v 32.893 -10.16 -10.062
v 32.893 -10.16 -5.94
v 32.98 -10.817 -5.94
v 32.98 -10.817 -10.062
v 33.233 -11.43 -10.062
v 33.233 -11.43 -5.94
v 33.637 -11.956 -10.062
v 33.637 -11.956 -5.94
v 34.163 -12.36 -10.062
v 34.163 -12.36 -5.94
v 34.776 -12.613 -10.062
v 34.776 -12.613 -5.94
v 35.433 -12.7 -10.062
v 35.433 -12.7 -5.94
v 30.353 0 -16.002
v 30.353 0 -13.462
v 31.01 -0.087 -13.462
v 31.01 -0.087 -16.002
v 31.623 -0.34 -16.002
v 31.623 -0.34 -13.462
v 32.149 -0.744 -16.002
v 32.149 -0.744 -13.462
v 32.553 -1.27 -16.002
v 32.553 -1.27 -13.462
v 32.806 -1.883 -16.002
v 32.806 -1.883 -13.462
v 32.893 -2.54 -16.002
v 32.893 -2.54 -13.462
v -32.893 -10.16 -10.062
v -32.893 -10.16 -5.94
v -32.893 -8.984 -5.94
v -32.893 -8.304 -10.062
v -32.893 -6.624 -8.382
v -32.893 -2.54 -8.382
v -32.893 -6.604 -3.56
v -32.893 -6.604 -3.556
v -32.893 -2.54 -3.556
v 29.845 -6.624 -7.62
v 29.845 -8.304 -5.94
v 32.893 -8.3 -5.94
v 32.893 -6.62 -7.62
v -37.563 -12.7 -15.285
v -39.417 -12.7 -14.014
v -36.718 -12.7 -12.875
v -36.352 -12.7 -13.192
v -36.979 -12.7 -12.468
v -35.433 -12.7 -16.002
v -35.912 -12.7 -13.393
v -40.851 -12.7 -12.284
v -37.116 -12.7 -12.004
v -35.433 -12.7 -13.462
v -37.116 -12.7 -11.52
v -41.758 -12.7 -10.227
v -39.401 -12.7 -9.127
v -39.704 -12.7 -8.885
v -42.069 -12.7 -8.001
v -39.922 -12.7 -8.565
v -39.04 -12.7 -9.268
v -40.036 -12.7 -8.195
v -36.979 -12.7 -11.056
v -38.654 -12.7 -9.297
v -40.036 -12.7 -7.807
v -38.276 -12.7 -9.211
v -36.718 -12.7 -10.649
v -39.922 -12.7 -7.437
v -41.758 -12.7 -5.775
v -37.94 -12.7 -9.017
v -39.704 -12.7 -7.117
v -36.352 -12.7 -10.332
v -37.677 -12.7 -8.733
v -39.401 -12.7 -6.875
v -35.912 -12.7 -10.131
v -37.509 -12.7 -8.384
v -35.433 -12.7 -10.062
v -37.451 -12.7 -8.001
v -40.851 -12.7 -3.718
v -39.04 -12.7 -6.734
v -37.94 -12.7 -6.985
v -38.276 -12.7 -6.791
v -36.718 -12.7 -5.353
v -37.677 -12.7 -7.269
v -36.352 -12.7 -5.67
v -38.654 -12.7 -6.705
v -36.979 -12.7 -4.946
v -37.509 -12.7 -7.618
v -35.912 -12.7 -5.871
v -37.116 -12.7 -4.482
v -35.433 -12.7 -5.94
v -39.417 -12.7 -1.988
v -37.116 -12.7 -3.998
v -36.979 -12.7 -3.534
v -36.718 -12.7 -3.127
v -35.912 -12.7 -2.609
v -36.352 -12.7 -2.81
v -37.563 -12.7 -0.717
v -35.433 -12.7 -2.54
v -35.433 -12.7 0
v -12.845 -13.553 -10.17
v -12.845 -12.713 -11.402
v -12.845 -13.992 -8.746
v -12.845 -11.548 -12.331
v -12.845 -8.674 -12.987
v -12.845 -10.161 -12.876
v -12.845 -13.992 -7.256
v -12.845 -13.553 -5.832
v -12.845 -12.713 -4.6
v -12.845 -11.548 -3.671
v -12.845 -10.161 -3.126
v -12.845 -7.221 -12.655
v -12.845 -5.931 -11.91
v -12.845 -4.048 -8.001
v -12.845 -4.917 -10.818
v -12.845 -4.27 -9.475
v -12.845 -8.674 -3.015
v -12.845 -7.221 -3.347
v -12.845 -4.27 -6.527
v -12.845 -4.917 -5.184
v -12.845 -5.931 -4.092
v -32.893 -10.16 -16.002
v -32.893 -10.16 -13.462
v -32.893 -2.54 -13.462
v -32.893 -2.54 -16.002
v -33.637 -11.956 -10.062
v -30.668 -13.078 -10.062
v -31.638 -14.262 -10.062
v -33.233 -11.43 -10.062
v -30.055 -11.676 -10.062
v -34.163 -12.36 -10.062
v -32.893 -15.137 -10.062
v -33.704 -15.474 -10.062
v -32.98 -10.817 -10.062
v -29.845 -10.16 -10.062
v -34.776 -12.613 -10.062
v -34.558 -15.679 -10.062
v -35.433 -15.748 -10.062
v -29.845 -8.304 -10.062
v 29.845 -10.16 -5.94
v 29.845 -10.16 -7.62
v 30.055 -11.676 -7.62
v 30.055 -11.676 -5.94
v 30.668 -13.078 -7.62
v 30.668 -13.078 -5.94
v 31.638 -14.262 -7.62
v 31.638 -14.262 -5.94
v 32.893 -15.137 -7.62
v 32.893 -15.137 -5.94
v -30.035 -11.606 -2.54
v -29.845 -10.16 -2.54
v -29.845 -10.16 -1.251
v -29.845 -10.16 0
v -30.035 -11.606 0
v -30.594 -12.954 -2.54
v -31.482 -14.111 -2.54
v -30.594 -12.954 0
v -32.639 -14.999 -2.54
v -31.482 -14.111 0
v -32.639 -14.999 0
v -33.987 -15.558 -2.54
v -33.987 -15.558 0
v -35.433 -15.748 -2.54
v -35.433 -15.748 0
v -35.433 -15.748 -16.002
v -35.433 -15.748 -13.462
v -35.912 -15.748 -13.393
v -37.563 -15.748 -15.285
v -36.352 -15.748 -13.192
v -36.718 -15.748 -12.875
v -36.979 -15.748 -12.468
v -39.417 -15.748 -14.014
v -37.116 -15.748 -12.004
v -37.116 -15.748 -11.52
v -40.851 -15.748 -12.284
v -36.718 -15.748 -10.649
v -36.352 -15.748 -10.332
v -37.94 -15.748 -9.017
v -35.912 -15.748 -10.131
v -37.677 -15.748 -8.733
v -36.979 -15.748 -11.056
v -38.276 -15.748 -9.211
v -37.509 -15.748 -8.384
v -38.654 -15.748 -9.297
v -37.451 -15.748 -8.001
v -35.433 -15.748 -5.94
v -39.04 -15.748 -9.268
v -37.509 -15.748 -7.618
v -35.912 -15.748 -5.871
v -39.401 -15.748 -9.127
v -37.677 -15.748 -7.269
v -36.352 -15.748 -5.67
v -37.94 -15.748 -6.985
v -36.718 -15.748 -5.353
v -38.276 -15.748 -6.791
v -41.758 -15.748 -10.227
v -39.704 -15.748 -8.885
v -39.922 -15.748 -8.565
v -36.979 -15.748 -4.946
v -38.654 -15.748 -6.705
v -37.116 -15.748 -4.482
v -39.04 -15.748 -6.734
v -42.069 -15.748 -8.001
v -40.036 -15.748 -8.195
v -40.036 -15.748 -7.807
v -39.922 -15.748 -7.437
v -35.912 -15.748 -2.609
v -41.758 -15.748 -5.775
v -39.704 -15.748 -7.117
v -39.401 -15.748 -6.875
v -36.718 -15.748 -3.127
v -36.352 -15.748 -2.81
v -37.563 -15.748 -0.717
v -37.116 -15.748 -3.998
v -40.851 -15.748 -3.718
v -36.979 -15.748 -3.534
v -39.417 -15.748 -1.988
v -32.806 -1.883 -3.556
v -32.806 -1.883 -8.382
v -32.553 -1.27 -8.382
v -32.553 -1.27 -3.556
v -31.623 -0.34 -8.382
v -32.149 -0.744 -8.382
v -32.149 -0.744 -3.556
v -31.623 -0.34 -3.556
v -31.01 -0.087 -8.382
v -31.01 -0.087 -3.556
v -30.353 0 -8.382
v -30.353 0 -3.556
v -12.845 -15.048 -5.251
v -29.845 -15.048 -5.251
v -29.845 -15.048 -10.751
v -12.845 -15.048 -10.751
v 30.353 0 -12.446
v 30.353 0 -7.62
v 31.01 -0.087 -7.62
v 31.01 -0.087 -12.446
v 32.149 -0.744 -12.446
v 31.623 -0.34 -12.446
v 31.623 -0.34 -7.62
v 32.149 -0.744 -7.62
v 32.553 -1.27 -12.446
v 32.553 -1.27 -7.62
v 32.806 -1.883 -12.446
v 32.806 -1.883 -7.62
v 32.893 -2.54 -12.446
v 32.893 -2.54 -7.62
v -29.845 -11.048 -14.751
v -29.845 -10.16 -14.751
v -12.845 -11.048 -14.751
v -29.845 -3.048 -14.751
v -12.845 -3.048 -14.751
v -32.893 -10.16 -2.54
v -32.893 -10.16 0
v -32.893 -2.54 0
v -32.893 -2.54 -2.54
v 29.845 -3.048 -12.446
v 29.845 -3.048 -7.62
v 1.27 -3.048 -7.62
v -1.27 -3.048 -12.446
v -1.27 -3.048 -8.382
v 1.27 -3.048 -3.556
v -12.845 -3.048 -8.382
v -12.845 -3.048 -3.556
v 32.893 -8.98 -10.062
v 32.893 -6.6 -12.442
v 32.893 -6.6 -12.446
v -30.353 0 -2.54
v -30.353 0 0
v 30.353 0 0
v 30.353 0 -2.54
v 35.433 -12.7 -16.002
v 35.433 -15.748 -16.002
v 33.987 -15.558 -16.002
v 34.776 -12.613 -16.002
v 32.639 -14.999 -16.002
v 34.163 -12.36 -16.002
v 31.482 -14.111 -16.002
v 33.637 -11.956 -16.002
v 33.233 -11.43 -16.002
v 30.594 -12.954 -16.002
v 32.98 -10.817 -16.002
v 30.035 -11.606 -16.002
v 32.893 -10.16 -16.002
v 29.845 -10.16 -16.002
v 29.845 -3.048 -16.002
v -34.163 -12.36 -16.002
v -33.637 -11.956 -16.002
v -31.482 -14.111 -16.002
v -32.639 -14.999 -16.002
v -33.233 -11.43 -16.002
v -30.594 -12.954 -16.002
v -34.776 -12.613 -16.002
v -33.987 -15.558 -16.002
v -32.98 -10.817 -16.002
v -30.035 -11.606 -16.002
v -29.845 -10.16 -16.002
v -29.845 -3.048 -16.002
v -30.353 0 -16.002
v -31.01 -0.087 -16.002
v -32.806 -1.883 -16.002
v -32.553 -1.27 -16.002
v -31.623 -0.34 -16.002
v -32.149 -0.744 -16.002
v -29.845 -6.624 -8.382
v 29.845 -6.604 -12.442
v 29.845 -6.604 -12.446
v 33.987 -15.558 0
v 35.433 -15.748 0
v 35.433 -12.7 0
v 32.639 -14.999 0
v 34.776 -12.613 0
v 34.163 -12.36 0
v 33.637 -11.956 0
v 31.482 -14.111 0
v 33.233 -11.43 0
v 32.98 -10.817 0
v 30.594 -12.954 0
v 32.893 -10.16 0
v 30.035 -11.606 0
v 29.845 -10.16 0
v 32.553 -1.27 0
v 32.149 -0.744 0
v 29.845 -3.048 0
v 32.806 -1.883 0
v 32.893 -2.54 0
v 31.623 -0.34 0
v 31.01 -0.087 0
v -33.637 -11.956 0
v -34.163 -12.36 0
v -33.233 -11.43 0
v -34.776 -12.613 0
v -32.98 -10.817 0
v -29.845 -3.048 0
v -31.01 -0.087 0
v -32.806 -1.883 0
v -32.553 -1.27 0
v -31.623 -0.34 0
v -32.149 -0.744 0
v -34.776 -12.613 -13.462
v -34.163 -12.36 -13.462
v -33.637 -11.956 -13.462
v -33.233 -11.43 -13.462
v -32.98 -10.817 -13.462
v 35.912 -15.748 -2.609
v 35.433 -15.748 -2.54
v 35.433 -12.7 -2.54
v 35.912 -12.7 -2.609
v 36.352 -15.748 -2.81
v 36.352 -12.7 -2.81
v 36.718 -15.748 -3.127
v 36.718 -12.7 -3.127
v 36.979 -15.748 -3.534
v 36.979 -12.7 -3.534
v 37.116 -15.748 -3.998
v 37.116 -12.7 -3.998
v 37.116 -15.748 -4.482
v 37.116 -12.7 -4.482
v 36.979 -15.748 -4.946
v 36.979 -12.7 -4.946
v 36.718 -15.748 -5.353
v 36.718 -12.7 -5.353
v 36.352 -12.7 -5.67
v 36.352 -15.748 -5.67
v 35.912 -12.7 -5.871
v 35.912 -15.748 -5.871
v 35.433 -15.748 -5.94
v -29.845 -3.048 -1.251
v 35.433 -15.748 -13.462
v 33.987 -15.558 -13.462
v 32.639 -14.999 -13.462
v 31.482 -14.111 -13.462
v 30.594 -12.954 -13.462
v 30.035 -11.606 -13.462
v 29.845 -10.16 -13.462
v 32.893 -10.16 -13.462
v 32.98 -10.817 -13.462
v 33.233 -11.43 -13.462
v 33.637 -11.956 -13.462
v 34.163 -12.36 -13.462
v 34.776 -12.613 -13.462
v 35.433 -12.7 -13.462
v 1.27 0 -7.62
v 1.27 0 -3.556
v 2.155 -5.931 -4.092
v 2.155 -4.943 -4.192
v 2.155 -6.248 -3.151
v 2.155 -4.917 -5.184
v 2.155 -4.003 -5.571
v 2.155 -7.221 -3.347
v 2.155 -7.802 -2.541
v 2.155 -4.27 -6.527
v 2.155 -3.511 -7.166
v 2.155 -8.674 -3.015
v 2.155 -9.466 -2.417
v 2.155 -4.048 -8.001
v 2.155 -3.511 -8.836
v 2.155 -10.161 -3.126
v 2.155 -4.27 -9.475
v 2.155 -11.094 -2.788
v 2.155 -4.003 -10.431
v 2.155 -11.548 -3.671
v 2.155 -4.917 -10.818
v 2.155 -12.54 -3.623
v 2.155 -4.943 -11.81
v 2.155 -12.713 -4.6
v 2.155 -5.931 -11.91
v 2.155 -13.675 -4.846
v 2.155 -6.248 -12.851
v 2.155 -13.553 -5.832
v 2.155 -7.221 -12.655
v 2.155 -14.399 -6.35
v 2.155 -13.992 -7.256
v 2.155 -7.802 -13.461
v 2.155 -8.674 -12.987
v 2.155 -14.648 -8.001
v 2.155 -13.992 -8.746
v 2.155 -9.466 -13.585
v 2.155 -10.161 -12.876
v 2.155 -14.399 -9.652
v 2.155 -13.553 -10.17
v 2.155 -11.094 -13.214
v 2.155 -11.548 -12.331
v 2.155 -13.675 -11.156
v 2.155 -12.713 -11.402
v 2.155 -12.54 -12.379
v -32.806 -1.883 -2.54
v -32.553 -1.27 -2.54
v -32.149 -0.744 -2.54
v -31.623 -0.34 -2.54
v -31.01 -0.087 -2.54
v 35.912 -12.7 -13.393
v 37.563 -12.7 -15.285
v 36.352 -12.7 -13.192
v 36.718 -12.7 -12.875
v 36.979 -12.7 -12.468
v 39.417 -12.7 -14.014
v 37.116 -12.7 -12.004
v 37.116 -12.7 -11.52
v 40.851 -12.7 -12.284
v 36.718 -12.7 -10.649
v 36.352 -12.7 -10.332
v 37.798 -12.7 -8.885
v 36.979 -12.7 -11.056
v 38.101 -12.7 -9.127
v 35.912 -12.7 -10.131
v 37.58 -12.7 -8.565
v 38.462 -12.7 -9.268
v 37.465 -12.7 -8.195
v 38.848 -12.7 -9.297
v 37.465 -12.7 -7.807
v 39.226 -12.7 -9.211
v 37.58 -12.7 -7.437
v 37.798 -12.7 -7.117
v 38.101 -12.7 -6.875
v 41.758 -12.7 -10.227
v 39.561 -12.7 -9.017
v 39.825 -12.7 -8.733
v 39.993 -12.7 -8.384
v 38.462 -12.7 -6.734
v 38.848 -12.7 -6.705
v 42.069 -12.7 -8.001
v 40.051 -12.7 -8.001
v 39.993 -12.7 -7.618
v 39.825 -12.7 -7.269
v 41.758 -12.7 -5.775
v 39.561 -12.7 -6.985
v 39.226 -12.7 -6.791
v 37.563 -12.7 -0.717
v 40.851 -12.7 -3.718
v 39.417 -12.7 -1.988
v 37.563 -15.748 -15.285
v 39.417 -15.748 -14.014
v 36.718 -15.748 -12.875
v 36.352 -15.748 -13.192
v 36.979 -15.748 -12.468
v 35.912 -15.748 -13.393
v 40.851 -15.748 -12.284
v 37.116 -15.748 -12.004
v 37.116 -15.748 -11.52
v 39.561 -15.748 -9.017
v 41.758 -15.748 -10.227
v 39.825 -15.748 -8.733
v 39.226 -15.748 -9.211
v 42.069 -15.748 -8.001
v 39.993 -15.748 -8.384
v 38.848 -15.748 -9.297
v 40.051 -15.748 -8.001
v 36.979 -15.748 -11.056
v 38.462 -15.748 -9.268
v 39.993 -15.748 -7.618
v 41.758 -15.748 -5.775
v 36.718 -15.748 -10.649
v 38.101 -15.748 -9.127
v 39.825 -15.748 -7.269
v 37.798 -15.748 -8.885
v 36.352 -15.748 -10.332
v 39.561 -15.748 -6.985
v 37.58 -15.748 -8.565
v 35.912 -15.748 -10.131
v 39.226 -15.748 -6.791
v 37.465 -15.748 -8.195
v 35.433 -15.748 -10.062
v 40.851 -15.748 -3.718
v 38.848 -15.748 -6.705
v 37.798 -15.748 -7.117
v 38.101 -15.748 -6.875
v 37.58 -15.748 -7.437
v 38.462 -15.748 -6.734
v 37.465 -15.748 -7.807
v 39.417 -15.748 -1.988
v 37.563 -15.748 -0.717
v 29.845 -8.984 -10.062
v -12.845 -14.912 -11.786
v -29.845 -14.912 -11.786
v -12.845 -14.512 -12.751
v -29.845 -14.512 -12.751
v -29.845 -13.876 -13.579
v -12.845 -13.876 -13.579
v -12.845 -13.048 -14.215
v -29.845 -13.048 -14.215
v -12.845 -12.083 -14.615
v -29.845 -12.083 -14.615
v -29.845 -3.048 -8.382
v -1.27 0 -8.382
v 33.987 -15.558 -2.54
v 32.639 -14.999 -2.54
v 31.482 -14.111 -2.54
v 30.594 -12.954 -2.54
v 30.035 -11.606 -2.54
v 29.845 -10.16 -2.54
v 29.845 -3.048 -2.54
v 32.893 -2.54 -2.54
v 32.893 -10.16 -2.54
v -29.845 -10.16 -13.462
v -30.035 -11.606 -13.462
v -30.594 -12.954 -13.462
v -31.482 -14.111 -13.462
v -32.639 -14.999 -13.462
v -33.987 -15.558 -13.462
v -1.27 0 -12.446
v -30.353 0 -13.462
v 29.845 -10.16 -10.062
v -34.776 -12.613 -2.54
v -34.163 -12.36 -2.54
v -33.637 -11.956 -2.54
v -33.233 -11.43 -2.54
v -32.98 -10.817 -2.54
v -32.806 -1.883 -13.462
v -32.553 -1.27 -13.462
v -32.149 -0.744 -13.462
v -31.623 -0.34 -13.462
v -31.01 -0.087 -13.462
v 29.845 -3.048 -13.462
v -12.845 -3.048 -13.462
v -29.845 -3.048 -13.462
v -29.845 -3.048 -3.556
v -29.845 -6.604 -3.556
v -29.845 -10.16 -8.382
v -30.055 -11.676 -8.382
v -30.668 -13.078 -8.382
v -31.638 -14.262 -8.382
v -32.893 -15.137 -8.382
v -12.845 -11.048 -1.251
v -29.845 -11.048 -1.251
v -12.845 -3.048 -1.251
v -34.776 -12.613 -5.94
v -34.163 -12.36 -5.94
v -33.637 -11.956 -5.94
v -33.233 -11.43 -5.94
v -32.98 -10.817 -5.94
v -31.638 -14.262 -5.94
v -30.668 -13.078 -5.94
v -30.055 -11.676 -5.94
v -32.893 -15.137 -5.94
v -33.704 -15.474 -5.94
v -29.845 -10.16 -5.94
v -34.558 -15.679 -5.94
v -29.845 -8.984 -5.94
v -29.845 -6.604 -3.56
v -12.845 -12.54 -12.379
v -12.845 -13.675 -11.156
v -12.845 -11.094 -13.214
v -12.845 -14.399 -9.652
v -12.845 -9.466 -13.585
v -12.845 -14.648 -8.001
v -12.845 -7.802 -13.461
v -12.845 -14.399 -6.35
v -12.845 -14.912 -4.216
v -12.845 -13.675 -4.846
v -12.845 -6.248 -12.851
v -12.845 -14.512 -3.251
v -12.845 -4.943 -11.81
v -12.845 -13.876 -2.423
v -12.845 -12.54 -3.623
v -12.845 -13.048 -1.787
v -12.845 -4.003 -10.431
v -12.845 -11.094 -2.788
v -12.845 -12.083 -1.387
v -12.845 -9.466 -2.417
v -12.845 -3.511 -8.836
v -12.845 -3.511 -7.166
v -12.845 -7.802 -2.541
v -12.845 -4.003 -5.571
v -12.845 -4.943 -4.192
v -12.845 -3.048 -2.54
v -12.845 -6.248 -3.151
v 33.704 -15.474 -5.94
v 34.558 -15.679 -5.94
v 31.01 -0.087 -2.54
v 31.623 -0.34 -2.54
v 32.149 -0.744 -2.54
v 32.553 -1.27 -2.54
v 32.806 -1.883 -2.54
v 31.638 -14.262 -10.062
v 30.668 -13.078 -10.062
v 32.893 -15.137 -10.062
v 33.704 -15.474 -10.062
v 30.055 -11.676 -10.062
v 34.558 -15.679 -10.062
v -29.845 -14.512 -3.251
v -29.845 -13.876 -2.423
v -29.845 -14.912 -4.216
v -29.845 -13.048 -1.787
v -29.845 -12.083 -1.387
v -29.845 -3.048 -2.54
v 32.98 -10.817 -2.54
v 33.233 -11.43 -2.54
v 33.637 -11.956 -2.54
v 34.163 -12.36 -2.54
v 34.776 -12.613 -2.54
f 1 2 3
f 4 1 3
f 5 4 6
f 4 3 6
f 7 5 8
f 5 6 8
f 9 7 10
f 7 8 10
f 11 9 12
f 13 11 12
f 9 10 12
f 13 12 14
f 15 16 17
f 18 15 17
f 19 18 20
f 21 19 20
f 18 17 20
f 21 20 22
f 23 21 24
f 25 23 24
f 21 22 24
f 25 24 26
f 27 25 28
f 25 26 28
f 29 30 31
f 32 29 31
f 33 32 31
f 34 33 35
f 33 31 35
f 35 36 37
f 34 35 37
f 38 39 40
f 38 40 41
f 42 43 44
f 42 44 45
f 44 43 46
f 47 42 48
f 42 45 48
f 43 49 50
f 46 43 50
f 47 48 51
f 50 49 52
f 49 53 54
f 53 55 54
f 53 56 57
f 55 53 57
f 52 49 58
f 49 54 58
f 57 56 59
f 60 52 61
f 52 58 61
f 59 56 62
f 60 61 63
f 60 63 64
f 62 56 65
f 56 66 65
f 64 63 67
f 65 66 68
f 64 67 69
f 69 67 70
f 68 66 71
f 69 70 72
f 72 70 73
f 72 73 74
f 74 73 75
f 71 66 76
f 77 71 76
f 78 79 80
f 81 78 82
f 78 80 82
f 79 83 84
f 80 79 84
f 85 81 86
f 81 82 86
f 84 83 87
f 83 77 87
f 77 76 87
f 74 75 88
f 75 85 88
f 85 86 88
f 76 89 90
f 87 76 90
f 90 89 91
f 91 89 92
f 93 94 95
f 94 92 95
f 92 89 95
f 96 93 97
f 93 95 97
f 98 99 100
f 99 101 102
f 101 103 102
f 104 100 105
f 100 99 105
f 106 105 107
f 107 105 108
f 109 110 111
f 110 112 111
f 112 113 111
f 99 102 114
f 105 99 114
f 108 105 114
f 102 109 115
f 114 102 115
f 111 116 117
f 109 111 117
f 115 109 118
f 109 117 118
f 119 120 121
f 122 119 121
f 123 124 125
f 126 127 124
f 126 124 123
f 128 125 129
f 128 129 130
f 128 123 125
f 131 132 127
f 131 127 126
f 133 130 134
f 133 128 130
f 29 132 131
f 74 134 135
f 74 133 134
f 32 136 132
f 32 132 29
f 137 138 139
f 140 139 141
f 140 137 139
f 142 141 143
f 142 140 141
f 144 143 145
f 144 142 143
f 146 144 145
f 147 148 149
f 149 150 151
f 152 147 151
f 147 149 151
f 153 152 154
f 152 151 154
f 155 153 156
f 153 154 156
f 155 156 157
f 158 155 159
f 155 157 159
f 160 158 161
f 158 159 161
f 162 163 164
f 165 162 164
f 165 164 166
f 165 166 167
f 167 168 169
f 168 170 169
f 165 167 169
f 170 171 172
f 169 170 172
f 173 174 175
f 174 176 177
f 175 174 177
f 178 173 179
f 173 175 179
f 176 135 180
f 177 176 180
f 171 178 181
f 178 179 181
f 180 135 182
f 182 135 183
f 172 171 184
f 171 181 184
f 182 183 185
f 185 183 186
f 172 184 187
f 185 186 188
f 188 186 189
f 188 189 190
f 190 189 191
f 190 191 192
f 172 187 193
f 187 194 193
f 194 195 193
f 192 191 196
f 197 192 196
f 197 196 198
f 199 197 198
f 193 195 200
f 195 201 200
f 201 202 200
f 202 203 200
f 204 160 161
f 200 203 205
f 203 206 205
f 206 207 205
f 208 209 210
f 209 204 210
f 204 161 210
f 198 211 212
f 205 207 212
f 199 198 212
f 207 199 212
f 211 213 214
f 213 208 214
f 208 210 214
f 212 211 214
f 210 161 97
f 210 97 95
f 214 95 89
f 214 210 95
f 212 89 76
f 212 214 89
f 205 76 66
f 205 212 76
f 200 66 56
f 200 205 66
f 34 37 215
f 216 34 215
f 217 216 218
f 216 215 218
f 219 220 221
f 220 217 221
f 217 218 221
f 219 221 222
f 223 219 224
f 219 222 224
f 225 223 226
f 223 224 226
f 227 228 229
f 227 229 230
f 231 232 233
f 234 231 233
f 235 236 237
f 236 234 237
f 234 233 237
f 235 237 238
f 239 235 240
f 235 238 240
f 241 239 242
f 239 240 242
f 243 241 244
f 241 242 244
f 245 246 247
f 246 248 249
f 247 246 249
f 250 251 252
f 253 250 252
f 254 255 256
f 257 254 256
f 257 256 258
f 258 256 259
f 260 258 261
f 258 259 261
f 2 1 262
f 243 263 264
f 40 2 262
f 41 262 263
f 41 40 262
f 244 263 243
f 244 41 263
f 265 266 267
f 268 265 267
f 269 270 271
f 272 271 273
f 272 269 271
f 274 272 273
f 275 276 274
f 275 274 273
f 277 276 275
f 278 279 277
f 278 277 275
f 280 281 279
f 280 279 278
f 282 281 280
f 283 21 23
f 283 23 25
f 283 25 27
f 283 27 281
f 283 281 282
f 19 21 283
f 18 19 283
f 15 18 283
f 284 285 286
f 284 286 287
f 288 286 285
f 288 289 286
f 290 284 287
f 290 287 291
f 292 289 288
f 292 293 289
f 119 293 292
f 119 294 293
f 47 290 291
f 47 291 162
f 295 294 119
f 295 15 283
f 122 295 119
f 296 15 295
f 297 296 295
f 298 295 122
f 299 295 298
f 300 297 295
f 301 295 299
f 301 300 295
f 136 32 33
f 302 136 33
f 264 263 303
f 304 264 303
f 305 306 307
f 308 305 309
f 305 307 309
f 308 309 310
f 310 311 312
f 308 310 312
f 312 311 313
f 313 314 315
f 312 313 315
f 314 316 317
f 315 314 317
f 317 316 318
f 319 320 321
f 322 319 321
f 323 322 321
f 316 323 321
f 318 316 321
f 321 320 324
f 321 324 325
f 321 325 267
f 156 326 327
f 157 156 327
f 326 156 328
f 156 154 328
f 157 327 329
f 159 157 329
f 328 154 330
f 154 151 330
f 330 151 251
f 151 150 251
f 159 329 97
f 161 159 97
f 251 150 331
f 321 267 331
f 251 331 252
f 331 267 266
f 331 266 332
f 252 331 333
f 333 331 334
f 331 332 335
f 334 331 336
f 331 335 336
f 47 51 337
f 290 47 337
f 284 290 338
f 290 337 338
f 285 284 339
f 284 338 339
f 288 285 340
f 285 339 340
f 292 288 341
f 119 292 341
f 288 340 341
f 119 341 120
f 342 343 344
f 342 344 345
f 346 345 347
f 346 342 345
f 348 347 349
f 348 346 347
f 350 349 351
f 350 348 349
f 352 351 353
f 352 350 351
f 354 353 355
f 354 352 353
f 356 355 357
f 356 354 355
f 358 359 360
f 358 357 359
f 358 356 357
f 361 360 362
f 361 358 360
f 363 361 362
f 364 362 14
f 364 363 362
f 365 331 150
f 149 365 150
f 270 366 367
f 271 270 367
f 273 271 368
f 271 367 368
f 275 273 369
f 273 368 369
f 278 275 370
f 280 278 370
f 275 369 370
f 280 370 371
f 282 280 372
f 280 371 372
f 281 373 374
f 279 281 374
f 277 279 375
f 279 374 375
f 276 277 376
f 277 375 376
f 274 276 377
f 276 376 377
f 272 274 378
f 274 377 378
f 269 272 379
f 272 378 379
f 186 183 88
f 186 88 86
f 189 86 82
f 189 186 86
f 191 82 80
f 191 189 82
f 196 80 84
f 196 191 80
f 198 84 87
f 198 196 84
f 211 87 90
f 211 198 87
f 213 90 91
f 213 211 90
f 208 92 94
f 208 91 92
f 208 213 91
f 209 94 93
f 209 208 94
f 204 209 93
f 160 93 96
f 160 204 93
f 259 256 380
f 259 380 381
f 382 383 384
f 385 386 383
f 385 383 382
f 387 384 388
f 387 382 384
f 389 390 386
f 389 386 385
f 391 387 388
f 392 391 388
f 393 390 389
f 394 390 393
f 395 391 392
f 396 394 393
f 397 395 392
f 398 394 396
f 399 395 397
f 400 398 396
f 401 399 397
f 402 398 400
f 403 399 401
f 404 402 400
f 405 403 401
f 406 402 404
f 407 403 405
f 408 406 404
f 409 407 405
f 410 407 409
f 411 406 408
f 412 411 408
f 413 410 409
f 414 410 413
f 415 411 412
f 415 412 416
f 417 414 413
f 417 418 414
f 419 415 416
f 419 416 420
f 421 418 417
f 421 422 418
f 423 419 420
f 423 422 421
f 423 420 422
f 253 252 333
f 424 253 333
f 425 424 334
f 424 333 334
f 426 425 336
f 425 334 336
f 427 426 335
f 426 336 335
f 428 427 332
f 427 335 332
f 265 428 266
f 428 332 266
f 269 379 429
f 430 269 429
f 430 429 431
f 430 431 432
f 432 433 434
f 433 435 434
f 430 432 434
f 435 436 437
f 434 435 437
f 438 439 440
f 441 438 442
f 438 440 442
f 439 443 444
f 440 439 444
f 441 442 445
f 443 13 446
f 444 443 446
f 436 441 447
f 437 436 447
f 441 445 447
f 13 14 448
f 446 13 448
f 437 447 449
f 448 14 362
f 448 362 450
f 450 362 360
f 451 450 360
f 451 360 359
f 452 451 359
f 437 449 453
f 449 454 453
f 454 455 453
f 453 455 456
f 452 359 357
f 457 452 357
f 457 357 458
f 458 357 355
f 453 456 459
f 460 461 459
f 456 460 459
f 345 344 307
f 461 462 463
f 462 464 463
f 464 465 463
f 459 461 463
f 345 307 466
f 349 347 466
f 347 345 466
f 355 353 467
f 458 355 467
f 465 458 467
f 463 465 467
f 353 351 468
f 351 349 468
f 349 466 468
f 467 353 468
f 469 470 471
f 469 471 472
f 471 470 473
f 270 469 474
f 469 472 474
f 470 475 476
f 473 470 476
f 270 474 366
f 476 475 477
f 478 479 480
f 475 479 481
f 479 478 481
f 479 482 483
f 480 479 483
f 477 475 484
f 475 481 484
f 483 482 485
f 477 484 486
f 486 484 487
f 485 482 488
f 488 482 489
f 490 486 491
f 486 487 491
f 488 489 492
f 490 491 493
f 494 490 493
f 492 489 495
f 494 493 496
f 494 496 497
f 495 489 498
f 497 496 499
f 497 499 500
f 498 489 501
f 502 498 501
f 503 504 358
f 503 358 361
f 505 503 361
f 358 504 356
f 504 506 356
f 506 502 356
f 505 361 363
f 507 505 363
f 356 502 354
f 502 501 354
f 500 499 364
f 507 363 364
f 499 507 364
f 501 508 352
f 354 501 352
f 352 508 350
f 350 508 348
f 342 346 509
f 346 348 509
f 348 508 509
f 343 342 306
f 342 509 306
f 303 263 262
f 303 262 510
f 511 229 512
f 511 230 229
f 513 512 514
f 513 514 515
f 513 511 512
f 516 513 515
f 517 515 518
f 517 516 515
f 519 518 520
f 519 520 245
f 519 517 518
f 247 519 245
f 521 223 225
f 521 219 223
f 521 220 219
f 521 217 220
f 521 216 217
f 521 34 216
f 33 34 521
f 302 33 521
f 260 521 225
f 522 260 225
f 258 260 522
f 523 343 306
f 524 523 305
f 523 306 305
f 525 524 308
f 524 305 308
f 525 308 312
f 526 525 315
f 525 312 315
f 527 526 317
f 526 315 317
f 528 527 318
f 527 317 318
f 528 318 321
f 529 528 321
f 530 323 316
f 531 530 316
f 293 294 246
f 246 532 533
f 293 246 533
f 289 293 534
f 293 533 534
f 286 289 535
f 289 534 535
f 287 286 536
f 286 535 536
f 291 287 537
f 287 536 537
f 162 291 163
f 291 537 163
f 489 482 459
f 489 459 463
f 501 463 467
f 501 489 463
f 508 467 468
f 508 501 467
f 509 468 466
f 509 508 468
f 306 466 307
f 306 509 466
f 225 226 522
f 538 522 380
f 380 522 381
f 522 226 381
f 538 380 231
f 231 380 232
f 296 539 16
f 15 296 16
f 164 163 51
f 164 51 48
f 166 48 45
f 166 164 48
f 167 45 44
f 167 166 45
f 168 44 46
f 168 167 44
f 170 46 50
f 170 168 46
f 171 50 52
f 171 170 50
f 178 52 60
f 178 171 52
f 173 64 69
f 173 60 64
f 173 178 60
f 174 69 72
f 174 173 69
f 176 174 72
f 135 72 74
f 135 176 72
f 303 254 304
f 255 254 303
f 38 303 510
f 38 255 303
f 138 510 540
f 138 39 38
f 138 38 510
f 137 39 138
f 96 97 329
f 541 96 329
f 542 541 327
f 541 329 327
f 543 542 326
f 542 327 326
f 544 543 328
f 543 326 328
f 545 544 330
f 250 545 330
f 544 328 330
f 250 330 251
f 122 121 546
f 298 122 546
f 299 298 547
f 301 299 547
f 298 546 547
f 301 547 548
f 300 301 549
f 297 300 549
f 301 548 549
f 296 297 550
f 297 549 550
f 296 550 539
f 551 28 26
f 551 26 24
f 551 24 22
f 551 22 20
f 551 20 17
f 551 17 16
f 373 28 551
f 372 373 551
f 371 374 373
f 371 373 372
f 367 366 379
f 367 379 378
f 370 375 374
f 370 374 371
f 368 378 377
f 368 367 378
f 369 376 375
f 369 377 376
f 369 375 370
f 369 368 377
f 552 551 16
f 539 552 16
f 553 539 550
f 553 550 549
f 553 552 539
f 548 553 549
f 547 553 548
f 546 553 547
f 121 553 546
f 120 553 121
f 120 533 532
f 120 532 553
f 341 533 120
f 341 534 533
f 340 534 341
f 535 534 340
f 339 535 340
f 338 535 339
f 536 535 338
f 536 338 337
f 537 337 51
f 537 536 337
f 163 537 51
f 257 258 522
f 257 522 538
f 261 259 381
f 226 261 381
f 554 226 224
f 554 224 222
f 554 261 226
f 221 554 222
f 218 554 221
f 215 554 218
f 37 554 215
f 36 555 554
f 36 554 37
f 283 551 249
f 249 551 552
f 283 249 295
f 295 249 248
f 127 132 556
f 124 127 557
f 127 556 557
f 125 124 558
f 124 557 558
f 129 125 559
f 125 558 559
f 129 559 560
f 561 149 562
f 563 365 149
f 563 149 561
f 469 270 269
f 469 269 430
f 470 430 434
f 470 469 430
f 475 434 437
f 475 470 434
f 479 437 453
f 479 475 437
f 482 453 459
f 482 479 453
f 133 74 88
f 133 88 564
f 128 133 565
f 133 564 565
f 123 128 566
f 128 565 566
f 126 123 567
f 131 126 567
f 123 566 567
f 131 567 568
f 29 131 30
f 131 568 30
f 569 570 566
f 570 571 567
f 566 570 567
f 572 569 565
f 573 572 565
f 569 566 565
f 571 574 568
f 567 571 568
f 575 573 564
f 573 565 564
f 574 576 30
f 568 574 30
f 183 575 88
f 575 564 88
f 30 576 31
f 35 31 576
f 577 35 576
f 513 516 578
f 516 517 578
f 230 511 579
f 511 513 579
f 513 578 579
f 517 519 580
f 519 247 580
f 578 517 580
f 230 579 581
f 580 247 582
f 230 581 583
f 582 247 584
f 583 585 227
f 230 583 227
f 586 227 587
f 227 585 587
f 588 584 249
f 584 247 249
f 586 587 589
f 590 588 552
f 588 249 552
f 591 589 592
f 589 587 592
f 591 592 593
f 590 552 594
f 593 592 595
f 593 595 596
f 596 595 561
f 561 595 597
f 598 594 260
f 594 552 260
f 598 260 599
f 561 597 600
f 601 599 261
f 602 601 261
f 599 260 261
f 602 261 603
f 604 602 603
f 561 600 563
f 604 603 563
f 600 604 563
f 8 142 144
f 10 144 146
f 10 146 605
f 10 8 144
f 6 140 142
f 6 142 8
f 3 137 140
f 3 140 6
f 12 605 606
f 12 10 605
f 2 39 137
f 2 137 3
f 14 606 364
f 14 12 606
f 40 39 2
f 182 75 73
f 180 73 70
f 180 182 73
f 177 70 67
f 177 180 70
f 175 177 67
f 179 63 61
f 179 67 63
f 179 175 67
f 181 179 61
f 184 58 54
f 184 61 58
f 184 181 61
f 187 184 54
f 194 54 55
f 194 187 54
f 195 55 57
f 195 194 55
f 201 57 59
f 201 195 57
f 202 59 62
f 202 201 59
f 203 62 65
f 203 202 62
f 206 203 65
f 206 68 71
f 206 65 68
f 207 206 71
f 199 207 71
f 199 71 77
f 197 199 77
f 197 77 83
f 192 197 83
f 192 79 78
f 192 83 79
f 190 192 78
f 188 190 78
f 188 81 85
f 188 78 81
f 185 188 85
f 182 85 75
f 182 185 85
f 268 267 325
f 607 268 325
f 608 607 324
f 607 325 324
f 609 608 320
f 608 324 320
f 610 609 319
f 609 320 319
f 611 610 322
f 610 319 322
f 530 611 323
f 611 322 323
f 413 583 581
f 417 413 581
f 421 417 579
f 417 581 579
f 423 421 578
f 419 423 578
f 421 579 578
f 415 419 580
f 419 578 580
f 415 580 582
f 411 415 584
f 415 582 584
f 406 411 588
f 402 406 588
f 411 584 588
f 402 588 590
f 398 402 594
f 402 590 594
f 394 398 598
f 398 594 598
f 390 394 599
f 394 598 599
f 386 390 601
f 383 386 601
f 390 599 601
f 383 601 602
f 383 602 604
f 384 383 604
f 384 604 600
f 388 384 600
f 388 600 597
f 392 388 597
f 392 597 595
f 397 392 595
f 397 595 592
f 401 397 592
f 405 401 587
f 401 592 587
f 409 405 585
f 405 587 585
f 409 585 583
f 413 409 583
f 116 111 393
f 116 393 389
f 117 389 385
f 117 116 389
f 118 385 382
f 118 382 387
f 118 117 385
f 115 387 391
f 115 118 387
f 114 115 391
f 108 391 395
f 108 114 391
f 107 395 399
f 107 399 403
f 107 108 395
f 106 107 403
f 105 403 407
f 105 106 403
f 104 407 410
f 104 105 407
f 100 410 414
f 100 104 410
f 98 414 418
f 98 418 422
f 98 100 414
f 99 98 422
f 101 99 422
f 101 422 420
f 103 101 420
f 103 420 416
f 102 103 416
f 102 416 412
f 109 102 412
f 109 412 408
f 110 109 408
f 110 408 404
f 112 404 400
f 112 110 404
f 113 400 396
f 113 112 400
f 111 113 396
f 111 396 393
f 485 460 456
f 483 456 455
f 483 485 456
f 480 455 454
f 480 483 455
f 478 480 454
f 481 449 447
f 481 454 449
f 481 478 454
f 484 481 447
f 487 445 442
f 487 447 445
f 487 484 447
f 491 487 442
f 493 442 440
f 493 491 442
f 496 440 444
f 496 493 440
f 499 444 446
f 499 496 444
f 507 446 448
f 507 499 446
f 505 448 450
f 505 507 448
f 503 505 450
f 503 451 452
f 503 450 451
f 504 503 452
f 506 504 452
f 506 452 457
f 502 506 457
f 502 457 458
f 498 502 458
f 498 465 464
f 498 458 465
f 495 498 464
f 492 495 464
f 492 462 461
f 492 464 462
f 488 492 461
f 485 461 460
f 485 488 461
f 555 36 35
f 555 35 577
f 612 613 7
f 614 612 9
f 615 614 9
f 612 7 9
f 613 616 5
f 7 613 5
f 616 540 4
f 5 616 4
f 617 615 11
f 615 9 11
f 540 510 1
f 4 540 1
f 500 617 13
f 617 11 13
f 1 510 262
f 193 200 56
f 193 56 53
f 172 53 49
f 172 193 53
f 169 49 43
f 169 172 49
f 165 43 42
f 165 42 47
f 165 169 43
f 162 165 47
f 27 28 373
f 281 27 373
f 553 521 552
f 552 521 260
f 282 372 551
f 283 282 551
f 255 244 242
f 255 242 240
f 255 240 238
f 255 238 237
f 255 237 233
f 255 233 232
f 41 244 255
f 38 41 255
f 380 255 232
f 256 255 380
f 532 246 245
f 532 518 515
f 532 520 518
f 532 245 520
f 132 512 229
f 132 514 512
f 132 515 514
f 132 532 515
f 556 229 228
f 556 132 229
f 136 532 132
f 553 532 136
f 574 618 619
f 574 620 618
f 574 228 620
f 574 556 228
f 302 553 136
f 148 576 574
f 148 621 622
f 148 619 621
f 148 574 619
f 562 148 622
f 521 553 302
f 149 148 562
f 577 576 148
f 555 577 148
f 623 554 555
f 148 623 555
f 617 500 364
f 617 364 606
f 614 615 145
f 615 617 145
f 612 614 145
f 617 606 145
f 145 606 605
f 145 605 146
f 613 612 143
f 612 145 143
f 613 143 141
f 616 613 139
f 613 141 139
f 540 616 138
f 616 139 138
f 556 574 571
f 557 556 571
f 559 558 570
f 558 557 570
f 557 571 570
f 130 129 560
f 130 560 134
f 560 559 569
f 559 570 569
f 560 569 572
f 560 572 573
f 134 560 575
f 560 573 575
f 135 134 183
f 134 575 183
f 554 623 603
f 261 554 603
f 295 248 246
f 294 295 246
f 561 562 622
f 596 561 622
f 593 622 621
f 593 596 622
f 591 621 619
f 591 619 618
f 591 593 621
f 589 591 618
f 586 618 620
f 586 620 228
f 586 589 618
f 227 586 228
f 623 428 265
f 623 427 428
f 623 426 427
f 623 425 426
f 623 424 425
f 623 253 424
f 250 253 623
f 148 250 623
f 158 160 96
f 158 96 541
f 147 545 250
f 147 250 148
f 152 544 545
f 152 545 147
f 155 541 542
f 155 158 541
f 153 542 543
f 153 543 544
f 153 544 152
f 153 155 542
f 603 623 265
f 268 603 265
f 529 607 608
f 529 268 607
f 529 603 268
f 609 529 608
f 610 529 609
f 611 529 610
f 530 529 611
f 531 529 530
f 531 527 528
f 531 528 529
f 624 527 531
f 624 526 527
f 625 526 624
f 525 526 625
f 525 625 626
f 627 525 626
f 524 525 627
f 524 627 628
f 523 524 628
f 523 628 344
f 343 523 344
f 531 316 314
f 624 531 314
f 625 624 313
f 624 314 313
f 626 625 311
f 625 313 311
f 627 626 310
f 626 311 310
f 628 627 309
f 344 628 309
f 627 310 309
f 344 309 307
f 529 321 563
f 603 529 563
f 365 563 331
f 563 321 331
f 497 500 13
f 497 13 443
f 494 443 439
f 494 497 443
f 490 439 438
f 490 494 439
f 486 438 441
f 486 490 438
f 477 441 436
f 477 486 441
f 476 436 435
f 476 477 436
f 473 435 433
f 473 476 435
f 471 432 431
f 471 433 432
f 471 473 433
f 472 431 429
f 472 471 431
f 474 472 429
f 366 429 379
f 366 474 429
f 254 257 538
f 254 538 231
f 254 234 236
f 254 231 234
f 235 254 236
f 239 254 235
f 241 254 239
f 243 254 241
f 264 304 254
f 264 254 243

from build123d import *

# Parameters (mm, degrees)
EXTRUDE_THIN1_DEPTH    = 16.002
CUT_EXTRUDE1_START     = -15.748
CUT_EXTRUDE1_OUTLINE_R = 1.3
CUT_EXTRUDE1_DEPTH     = 15.748
BOSS_EXTRUDE2_DEPTH    = 1.68
BOSS_EXTRUDE3_START    = 1.68
BOSS_EXTRUDE3_DEPTH    = 1.68
CUT_EXTRUDE2_START     = -2.384
CUT_EXTRUDE2_DEPTH     = 2.384
CUT_EXTRUDE3_DEPTH     = 2.384
CHAMFER1_SIZE          = 1.7
CHAMFER2_SIZE          = 2.38
SKETCH10_W             = 17
SKETCH10_H             = 13.5
BOSS_EXTRUDE4_DEPTH    = 12
SKETCH11_R             = 5.6
SKETCH11_R_2           = 5
BOSS_EXTRUDE5_DEPTH    = 15
FILLET1_R              = 4


# Read off the part's stored shape, not the designer's step: Cut-Extrude1
with BuildPart() as part:
    # Sketch1 → Extrude-Thin1 (new body)
    with BuildSketch(Plane.XY):
        with BuildLine():
            Line((-42.06875, -12.7), (-35.433, -12.7))
            ThreePointArc((-35.433, -12.7), (-33.636948776, -11.956051224), (-32.893, -10.16))
            Line((-32.893, -10.16), (-32.893, -2.54))
            ThreePointArc((-32.893, -2.54), (-32.149051224, -0.743948776), (-30.353, 0))
            Line((-30.353, 0), (30.353, 0))
            ThreePointArc((30.353, 0), (32.149051224, -0.743948776), (32.893, -2.54))
            Line((32.893, -2.54), (32.893, -10.16))
            ThreePointArc((32.893, -10.16), (33.636948776, -11.956051224), (35.433, -12.7))
            Line((35.433, -12.7), (42.06875, -12.7))
            Line((42.06875, -12.7), (42.06875, -15.748))
            Line((42.06875, -15.748), (35.433, -15.748))
            ThreePointArc((35.433, -15.748), (31.481687307, -14.111312693), (29.845, -10.16))
            Line((29.845, -10.16), (29.845, -3.048))
            Line((29.845, -3.048), (-29.845, -3.048))
            Line((-29.845, -3.048), (-29.845, -10.16))
            ThreePointArc((-29.845, -10.16), (-31.481687307, -14.111312693), (-35.433, -15.748))
            Line((-35.433, -15.748), (-42.06875, -15.748))
            Line((-42.06875, -15.748), (-42.06875, -12.7))
        make_face()
    extrude(amount=-EXTRUDE_THIN1_DEPTH)

    # Cut-Extrude1 outline → Cut-Extrude1 (cut)
    with BuildSketch(Plane(origin=(0, 0, 0), x_dir=(1, 0, 0), z_dir=(0, 1, 0)).offset(CUT_EXTRUDE1_START)):
        with BuildLine():
            Line((35.433, 13.462), (-35.433, 13.462))
            ThreePointArc((-35.433, 13.462), (-37.133, 11.762), (-35.433, 10.062))
            Line((-35.433, 10.062), (-32.893, 10.062))
            Line((-32.893, 10.062), (-32.893, 8.382))
            Line((-32.893, 8.382), (-1.27, 8.382))
            Line((-1.27, 8.382), (-1.27, 12.446))
            Line((-1.27, 12.446), (32.893, 12.446))
            Line((32.893, 12.446), (32.893, 10.062))
            Line((32.893, 10.062), (35.433, 10.062))
            ThreePointArc((35.433, 10.062), (37.133, 11.762), (35.433, 13.462))
        make_face()
        with BuildLine():
            Line((32.893, 5.94), (32.893, 7.62))
            Line((32.893, 7.62), (1.27, 7.62))
            Line((1.27, 7.62), (1.27, 3.556))
            Line((1.27, 3.556), (-32.893, 3.556))
            Line((-32.893, 3.556), (-32.893, 5.94))
            Line((-32.893, 5.94), (-35.433, 5.94))
            ThreePointArc((-35.433, 5.94), (-37.133, 4.24), (-35.433, 2.54))
            Line((-35.433, 2.54), (35.433, 2.54))
            ThreePointArc((35.433, 2.54), (37.133, 4.24), (35.433, 5.94))
            Line((35.433, 5.94), (32.893, 5.94))
        make_face()
        with BuildLine():
            Line((42.06875, 16.002), (35.433, 16.002))
            ThreePointArc((35.433, 16.002), (40.193949205, 13.198335352), (42.06875, 8.001))
            Line((42.06875, 8.001), (42.06875, 16.002))
        make_face()
        with BuildLine():
            Line((42.06875, 0), (42.06875, 8.001))
            ThreePointArc((42.06875, 8.001), (40.193949205, 2.803664648), (35.433, 0))
            Line((35.433, 0), (42.06875, 0))
        make_face()
        with BuildLine():
            ThreePointArc((-42.06875, 8.001), (-40.193949205, 13.198335352), (-35.433, 16.002))
            Line((-35.433, 16.002), (-42.06875, 16.002))
            Line((-42.06875, 16.002), (-42.06875, 8.001))
        make_face()
        with BuildLine():
            ThreePointArc((-35.433, 0), (-40.193949205, 2.803664648), (-42.06875, 8.001))
            Line((-42.06875, 8.001), (-42.06875, 0))
            Line((-42.06875, 0), (-35.433, 0))
        make_face()
        with Locations((38.750875, 8.001)):
            Circle(CUT_EXTRUDE1_OUTLINE_R)
        with Locations((-38.750875, 8.001)):
            Circle(CUT_EXTRUDE1_OUTLINE_R)
    extrude(amount=CUT_EXTRUDE1_DEPTH, mode=Mode.SUBTRACT)

    # Sketch6 → Boss-Extrude2 (add)
    with BuildSketch(Plane(origin=(0, 0, -8.382), x_dir=(-1, 0, 0), z_dir=(0, 0, -1))):
        with BuildLine():
            Line((32.893, -10.16), (32.893, -6.604))
            Line((32.893, -6.604), (29.845, -6.604))
            Line((29.845, -6.604), (29.845, -10.16))
            ThreePointArc((29.845, -10.16), (30.667537588, -13.078237824), (32.893, -15.137363157))
            Line((32.893, -15.137363157), (32.893, -10.16))
        make_face()
    extrude(amount=BOSS_EXTRUDE2_DEPTH)

    # Sketch7 → Boss-Extrude3 (add)
    with BuildSketch(Plane.XY.offset(-7.62).offset(BOSS_EXTRUDE3_START)):
        with BuildLine():
            Line((32.893, -10.16), (32.893, -6.6))
            Line((32.893, -6.6), (29.845, -6.604))
            Line((29.845, -6.604), (29.845, -10.16))
            ThreePointArc((29.845, -10.16), (30.667537588, -13.078237824), (32.893, -15.137363157))
            Line((32.893, -15.137363157), (32.893, -10.16))
        make_face()
    extrude(amount=-BOSS_EXTRUDE3_DEPTH)

    # Sketch8 → Cut-Extrude2 (cut)
    with BuildSketch(Plane(origin=(0, 0, -12.446), x_dir=(-1, 0, 0), z_dir=(0, 0, -1)).offset(CUT_EXTRUDE2_START)):
        with BuildLine():
            Line((-32.893, -15.137363157), (-32.893, -6.6))
            Line((-32.893, -6.6), (-29.845, -6.604))
            Line((-29.845, -6.604), (-29.845, -10.16))
            ThreePointArc((-29.845, -10.16), (-30.667537588, -13.078237824), (-32.893, -15.137363157))
        make_face()
    extrude(amount=CUT_EXTRUDE2_DEPTH, mode=Mode.SUBTRACT)

    # Sketch9 → Cut-Extrude3 (cut)
    with BuildSketch(Plane.XY.offset(-3.556)):
        with BuildLine():
            Line((-32.893, -15.137363157), (-32.893, -6.604))
            Line((-32.893, -6.604), (-29.845, -6.604))
            Line((-29.845, -6.604), (-29.845, -10.16))
            ThreePointArc((-29.845, -10.16), (-30.667537588, -13.078237824), (-32.893, -15.137363157))
        make_face()
    extrude(amount=-CUT_EXTRUDE3_DEPTH, mode=Mode.SUBTRACT)

    # Chamfer1
    # the kernel refuses this chamfer: 1.7 mm, written as the material it adds along each edge
    # the kernel refuses this chamfer: 1.7 mm, written as the material it takes off along each edge
    with BuildSketch(Plane(origin=(-37.26486108, -6.604, -10.062), x_dir=(0, -0.9996219169112968, -0.02749587661058687), z_dir=(1, 0, 0))) as chamfer1_2_piece_1_section:
        Polygon((CHAMFER1_SIZE * 0.999621916911, -CHAMFER1_SIZE * 0.0274958766106), (-CHAMFER1_SIZE * 0.0274958766106, -CHAMFER1_SIZE * 0.999621916911), (0, 0), align=None)
    chamfer1_2_piece_1 = extrude(amount=11.791722159, mode=Mode.PRIVATE)
    chamfer1_2_piece_1 = split(chamfer1_2_piece_1, bisect_by=Plane(origin=(-31.369, -7.170744186, -8.382), z_dir=(0, 0, -1)), keep=Keep.TOP, mode=Mode.PRIVATE)
    add(chamfer1_2_piece_1, mode=Mode.SUBTRACT)
    with BuildSketch(Plane(origin=(37.264857315, -6.594262654, -5.94), x_dir=(0.00131183865632537, -0.9996210561251475, 0.02749587661058631), z_dir=(-0.999999138888279, -0.0013123348279305267, 0))) as chamfer1_2_piece_2_section:
        Polygon((CHAMFER1_SIZE * 0.999621916911, -CHAMFER1_SIZE * 0.0274958766106), (-CHAMFER1_SIZE * 0.0274958766106, -CHAMFER1_SIZE * 0.999621916911), (0, 0), align=None)
    chamfer1_2_piece_2 = extrude(amount=11.791724784, mode=Mode.PRIVATE)
    chamfer1_2_piece_2 = split(chamfer1_2_piece_2, bisect_by=Plane(origin=(31.369, -7.168744674, -7.62), z_dir=(0, 0, 1)), keep=Keep.TOP, mode=Mode.PRIVATE)
    add(chamfer1_2_piece_2, mode=Mode.SUBTRACT)

    # Chamfer2
    chamfer2_edges = [part.edges().sort_by_distance(p)[0] for p in [
        (31.369, -6.602, -10.062),
        (-31.369, -6.604, -5.94),
    ]]
    chamfer(chamfer2_edges, length=CHAMFER2_SIZE)

    # Sketch10 → Boss-Extrude4 (add)
    with BuildSketch(Plane.XZ.offset(3.048)):
        with Locations((-21.345, -8.001)):
            Rectangle(SKETCH10_W, SKETCH10_H)
    extrude(amount=BOSS_EXTRUDE4_DEPTH)

    # Sketch11 → Boss-Extrude5 (add)
    with BuildSketch(Plane(origin=(-12.845, 0, 0), x_dir=(0, 0, -1), z_dir=(1, 0, 0))):
        with Locations(Location((8.001, -9.048, 0), (0, 0, 270))):
            Circle(SKETCH11_R)
        with Locations(Location((8.001, -9.048, 0), (0, 0, 90))):
            Circle(SKETCH11_R_2, mode=Mode.SUBTRACT)
    extrude(amount=BOSS_EXTRUDE5_DEPTH)

    # Fillet1
    fillet1_edges = [part.edges().sort_by_distance(p)[0] for p in [
        (-21.345, -15.048, -14.751),
        (-21.345, -15.048, -1.251),
    ]]
    fillet(fillet1_edges, radius=FILLET1_R)


solid = part.part
